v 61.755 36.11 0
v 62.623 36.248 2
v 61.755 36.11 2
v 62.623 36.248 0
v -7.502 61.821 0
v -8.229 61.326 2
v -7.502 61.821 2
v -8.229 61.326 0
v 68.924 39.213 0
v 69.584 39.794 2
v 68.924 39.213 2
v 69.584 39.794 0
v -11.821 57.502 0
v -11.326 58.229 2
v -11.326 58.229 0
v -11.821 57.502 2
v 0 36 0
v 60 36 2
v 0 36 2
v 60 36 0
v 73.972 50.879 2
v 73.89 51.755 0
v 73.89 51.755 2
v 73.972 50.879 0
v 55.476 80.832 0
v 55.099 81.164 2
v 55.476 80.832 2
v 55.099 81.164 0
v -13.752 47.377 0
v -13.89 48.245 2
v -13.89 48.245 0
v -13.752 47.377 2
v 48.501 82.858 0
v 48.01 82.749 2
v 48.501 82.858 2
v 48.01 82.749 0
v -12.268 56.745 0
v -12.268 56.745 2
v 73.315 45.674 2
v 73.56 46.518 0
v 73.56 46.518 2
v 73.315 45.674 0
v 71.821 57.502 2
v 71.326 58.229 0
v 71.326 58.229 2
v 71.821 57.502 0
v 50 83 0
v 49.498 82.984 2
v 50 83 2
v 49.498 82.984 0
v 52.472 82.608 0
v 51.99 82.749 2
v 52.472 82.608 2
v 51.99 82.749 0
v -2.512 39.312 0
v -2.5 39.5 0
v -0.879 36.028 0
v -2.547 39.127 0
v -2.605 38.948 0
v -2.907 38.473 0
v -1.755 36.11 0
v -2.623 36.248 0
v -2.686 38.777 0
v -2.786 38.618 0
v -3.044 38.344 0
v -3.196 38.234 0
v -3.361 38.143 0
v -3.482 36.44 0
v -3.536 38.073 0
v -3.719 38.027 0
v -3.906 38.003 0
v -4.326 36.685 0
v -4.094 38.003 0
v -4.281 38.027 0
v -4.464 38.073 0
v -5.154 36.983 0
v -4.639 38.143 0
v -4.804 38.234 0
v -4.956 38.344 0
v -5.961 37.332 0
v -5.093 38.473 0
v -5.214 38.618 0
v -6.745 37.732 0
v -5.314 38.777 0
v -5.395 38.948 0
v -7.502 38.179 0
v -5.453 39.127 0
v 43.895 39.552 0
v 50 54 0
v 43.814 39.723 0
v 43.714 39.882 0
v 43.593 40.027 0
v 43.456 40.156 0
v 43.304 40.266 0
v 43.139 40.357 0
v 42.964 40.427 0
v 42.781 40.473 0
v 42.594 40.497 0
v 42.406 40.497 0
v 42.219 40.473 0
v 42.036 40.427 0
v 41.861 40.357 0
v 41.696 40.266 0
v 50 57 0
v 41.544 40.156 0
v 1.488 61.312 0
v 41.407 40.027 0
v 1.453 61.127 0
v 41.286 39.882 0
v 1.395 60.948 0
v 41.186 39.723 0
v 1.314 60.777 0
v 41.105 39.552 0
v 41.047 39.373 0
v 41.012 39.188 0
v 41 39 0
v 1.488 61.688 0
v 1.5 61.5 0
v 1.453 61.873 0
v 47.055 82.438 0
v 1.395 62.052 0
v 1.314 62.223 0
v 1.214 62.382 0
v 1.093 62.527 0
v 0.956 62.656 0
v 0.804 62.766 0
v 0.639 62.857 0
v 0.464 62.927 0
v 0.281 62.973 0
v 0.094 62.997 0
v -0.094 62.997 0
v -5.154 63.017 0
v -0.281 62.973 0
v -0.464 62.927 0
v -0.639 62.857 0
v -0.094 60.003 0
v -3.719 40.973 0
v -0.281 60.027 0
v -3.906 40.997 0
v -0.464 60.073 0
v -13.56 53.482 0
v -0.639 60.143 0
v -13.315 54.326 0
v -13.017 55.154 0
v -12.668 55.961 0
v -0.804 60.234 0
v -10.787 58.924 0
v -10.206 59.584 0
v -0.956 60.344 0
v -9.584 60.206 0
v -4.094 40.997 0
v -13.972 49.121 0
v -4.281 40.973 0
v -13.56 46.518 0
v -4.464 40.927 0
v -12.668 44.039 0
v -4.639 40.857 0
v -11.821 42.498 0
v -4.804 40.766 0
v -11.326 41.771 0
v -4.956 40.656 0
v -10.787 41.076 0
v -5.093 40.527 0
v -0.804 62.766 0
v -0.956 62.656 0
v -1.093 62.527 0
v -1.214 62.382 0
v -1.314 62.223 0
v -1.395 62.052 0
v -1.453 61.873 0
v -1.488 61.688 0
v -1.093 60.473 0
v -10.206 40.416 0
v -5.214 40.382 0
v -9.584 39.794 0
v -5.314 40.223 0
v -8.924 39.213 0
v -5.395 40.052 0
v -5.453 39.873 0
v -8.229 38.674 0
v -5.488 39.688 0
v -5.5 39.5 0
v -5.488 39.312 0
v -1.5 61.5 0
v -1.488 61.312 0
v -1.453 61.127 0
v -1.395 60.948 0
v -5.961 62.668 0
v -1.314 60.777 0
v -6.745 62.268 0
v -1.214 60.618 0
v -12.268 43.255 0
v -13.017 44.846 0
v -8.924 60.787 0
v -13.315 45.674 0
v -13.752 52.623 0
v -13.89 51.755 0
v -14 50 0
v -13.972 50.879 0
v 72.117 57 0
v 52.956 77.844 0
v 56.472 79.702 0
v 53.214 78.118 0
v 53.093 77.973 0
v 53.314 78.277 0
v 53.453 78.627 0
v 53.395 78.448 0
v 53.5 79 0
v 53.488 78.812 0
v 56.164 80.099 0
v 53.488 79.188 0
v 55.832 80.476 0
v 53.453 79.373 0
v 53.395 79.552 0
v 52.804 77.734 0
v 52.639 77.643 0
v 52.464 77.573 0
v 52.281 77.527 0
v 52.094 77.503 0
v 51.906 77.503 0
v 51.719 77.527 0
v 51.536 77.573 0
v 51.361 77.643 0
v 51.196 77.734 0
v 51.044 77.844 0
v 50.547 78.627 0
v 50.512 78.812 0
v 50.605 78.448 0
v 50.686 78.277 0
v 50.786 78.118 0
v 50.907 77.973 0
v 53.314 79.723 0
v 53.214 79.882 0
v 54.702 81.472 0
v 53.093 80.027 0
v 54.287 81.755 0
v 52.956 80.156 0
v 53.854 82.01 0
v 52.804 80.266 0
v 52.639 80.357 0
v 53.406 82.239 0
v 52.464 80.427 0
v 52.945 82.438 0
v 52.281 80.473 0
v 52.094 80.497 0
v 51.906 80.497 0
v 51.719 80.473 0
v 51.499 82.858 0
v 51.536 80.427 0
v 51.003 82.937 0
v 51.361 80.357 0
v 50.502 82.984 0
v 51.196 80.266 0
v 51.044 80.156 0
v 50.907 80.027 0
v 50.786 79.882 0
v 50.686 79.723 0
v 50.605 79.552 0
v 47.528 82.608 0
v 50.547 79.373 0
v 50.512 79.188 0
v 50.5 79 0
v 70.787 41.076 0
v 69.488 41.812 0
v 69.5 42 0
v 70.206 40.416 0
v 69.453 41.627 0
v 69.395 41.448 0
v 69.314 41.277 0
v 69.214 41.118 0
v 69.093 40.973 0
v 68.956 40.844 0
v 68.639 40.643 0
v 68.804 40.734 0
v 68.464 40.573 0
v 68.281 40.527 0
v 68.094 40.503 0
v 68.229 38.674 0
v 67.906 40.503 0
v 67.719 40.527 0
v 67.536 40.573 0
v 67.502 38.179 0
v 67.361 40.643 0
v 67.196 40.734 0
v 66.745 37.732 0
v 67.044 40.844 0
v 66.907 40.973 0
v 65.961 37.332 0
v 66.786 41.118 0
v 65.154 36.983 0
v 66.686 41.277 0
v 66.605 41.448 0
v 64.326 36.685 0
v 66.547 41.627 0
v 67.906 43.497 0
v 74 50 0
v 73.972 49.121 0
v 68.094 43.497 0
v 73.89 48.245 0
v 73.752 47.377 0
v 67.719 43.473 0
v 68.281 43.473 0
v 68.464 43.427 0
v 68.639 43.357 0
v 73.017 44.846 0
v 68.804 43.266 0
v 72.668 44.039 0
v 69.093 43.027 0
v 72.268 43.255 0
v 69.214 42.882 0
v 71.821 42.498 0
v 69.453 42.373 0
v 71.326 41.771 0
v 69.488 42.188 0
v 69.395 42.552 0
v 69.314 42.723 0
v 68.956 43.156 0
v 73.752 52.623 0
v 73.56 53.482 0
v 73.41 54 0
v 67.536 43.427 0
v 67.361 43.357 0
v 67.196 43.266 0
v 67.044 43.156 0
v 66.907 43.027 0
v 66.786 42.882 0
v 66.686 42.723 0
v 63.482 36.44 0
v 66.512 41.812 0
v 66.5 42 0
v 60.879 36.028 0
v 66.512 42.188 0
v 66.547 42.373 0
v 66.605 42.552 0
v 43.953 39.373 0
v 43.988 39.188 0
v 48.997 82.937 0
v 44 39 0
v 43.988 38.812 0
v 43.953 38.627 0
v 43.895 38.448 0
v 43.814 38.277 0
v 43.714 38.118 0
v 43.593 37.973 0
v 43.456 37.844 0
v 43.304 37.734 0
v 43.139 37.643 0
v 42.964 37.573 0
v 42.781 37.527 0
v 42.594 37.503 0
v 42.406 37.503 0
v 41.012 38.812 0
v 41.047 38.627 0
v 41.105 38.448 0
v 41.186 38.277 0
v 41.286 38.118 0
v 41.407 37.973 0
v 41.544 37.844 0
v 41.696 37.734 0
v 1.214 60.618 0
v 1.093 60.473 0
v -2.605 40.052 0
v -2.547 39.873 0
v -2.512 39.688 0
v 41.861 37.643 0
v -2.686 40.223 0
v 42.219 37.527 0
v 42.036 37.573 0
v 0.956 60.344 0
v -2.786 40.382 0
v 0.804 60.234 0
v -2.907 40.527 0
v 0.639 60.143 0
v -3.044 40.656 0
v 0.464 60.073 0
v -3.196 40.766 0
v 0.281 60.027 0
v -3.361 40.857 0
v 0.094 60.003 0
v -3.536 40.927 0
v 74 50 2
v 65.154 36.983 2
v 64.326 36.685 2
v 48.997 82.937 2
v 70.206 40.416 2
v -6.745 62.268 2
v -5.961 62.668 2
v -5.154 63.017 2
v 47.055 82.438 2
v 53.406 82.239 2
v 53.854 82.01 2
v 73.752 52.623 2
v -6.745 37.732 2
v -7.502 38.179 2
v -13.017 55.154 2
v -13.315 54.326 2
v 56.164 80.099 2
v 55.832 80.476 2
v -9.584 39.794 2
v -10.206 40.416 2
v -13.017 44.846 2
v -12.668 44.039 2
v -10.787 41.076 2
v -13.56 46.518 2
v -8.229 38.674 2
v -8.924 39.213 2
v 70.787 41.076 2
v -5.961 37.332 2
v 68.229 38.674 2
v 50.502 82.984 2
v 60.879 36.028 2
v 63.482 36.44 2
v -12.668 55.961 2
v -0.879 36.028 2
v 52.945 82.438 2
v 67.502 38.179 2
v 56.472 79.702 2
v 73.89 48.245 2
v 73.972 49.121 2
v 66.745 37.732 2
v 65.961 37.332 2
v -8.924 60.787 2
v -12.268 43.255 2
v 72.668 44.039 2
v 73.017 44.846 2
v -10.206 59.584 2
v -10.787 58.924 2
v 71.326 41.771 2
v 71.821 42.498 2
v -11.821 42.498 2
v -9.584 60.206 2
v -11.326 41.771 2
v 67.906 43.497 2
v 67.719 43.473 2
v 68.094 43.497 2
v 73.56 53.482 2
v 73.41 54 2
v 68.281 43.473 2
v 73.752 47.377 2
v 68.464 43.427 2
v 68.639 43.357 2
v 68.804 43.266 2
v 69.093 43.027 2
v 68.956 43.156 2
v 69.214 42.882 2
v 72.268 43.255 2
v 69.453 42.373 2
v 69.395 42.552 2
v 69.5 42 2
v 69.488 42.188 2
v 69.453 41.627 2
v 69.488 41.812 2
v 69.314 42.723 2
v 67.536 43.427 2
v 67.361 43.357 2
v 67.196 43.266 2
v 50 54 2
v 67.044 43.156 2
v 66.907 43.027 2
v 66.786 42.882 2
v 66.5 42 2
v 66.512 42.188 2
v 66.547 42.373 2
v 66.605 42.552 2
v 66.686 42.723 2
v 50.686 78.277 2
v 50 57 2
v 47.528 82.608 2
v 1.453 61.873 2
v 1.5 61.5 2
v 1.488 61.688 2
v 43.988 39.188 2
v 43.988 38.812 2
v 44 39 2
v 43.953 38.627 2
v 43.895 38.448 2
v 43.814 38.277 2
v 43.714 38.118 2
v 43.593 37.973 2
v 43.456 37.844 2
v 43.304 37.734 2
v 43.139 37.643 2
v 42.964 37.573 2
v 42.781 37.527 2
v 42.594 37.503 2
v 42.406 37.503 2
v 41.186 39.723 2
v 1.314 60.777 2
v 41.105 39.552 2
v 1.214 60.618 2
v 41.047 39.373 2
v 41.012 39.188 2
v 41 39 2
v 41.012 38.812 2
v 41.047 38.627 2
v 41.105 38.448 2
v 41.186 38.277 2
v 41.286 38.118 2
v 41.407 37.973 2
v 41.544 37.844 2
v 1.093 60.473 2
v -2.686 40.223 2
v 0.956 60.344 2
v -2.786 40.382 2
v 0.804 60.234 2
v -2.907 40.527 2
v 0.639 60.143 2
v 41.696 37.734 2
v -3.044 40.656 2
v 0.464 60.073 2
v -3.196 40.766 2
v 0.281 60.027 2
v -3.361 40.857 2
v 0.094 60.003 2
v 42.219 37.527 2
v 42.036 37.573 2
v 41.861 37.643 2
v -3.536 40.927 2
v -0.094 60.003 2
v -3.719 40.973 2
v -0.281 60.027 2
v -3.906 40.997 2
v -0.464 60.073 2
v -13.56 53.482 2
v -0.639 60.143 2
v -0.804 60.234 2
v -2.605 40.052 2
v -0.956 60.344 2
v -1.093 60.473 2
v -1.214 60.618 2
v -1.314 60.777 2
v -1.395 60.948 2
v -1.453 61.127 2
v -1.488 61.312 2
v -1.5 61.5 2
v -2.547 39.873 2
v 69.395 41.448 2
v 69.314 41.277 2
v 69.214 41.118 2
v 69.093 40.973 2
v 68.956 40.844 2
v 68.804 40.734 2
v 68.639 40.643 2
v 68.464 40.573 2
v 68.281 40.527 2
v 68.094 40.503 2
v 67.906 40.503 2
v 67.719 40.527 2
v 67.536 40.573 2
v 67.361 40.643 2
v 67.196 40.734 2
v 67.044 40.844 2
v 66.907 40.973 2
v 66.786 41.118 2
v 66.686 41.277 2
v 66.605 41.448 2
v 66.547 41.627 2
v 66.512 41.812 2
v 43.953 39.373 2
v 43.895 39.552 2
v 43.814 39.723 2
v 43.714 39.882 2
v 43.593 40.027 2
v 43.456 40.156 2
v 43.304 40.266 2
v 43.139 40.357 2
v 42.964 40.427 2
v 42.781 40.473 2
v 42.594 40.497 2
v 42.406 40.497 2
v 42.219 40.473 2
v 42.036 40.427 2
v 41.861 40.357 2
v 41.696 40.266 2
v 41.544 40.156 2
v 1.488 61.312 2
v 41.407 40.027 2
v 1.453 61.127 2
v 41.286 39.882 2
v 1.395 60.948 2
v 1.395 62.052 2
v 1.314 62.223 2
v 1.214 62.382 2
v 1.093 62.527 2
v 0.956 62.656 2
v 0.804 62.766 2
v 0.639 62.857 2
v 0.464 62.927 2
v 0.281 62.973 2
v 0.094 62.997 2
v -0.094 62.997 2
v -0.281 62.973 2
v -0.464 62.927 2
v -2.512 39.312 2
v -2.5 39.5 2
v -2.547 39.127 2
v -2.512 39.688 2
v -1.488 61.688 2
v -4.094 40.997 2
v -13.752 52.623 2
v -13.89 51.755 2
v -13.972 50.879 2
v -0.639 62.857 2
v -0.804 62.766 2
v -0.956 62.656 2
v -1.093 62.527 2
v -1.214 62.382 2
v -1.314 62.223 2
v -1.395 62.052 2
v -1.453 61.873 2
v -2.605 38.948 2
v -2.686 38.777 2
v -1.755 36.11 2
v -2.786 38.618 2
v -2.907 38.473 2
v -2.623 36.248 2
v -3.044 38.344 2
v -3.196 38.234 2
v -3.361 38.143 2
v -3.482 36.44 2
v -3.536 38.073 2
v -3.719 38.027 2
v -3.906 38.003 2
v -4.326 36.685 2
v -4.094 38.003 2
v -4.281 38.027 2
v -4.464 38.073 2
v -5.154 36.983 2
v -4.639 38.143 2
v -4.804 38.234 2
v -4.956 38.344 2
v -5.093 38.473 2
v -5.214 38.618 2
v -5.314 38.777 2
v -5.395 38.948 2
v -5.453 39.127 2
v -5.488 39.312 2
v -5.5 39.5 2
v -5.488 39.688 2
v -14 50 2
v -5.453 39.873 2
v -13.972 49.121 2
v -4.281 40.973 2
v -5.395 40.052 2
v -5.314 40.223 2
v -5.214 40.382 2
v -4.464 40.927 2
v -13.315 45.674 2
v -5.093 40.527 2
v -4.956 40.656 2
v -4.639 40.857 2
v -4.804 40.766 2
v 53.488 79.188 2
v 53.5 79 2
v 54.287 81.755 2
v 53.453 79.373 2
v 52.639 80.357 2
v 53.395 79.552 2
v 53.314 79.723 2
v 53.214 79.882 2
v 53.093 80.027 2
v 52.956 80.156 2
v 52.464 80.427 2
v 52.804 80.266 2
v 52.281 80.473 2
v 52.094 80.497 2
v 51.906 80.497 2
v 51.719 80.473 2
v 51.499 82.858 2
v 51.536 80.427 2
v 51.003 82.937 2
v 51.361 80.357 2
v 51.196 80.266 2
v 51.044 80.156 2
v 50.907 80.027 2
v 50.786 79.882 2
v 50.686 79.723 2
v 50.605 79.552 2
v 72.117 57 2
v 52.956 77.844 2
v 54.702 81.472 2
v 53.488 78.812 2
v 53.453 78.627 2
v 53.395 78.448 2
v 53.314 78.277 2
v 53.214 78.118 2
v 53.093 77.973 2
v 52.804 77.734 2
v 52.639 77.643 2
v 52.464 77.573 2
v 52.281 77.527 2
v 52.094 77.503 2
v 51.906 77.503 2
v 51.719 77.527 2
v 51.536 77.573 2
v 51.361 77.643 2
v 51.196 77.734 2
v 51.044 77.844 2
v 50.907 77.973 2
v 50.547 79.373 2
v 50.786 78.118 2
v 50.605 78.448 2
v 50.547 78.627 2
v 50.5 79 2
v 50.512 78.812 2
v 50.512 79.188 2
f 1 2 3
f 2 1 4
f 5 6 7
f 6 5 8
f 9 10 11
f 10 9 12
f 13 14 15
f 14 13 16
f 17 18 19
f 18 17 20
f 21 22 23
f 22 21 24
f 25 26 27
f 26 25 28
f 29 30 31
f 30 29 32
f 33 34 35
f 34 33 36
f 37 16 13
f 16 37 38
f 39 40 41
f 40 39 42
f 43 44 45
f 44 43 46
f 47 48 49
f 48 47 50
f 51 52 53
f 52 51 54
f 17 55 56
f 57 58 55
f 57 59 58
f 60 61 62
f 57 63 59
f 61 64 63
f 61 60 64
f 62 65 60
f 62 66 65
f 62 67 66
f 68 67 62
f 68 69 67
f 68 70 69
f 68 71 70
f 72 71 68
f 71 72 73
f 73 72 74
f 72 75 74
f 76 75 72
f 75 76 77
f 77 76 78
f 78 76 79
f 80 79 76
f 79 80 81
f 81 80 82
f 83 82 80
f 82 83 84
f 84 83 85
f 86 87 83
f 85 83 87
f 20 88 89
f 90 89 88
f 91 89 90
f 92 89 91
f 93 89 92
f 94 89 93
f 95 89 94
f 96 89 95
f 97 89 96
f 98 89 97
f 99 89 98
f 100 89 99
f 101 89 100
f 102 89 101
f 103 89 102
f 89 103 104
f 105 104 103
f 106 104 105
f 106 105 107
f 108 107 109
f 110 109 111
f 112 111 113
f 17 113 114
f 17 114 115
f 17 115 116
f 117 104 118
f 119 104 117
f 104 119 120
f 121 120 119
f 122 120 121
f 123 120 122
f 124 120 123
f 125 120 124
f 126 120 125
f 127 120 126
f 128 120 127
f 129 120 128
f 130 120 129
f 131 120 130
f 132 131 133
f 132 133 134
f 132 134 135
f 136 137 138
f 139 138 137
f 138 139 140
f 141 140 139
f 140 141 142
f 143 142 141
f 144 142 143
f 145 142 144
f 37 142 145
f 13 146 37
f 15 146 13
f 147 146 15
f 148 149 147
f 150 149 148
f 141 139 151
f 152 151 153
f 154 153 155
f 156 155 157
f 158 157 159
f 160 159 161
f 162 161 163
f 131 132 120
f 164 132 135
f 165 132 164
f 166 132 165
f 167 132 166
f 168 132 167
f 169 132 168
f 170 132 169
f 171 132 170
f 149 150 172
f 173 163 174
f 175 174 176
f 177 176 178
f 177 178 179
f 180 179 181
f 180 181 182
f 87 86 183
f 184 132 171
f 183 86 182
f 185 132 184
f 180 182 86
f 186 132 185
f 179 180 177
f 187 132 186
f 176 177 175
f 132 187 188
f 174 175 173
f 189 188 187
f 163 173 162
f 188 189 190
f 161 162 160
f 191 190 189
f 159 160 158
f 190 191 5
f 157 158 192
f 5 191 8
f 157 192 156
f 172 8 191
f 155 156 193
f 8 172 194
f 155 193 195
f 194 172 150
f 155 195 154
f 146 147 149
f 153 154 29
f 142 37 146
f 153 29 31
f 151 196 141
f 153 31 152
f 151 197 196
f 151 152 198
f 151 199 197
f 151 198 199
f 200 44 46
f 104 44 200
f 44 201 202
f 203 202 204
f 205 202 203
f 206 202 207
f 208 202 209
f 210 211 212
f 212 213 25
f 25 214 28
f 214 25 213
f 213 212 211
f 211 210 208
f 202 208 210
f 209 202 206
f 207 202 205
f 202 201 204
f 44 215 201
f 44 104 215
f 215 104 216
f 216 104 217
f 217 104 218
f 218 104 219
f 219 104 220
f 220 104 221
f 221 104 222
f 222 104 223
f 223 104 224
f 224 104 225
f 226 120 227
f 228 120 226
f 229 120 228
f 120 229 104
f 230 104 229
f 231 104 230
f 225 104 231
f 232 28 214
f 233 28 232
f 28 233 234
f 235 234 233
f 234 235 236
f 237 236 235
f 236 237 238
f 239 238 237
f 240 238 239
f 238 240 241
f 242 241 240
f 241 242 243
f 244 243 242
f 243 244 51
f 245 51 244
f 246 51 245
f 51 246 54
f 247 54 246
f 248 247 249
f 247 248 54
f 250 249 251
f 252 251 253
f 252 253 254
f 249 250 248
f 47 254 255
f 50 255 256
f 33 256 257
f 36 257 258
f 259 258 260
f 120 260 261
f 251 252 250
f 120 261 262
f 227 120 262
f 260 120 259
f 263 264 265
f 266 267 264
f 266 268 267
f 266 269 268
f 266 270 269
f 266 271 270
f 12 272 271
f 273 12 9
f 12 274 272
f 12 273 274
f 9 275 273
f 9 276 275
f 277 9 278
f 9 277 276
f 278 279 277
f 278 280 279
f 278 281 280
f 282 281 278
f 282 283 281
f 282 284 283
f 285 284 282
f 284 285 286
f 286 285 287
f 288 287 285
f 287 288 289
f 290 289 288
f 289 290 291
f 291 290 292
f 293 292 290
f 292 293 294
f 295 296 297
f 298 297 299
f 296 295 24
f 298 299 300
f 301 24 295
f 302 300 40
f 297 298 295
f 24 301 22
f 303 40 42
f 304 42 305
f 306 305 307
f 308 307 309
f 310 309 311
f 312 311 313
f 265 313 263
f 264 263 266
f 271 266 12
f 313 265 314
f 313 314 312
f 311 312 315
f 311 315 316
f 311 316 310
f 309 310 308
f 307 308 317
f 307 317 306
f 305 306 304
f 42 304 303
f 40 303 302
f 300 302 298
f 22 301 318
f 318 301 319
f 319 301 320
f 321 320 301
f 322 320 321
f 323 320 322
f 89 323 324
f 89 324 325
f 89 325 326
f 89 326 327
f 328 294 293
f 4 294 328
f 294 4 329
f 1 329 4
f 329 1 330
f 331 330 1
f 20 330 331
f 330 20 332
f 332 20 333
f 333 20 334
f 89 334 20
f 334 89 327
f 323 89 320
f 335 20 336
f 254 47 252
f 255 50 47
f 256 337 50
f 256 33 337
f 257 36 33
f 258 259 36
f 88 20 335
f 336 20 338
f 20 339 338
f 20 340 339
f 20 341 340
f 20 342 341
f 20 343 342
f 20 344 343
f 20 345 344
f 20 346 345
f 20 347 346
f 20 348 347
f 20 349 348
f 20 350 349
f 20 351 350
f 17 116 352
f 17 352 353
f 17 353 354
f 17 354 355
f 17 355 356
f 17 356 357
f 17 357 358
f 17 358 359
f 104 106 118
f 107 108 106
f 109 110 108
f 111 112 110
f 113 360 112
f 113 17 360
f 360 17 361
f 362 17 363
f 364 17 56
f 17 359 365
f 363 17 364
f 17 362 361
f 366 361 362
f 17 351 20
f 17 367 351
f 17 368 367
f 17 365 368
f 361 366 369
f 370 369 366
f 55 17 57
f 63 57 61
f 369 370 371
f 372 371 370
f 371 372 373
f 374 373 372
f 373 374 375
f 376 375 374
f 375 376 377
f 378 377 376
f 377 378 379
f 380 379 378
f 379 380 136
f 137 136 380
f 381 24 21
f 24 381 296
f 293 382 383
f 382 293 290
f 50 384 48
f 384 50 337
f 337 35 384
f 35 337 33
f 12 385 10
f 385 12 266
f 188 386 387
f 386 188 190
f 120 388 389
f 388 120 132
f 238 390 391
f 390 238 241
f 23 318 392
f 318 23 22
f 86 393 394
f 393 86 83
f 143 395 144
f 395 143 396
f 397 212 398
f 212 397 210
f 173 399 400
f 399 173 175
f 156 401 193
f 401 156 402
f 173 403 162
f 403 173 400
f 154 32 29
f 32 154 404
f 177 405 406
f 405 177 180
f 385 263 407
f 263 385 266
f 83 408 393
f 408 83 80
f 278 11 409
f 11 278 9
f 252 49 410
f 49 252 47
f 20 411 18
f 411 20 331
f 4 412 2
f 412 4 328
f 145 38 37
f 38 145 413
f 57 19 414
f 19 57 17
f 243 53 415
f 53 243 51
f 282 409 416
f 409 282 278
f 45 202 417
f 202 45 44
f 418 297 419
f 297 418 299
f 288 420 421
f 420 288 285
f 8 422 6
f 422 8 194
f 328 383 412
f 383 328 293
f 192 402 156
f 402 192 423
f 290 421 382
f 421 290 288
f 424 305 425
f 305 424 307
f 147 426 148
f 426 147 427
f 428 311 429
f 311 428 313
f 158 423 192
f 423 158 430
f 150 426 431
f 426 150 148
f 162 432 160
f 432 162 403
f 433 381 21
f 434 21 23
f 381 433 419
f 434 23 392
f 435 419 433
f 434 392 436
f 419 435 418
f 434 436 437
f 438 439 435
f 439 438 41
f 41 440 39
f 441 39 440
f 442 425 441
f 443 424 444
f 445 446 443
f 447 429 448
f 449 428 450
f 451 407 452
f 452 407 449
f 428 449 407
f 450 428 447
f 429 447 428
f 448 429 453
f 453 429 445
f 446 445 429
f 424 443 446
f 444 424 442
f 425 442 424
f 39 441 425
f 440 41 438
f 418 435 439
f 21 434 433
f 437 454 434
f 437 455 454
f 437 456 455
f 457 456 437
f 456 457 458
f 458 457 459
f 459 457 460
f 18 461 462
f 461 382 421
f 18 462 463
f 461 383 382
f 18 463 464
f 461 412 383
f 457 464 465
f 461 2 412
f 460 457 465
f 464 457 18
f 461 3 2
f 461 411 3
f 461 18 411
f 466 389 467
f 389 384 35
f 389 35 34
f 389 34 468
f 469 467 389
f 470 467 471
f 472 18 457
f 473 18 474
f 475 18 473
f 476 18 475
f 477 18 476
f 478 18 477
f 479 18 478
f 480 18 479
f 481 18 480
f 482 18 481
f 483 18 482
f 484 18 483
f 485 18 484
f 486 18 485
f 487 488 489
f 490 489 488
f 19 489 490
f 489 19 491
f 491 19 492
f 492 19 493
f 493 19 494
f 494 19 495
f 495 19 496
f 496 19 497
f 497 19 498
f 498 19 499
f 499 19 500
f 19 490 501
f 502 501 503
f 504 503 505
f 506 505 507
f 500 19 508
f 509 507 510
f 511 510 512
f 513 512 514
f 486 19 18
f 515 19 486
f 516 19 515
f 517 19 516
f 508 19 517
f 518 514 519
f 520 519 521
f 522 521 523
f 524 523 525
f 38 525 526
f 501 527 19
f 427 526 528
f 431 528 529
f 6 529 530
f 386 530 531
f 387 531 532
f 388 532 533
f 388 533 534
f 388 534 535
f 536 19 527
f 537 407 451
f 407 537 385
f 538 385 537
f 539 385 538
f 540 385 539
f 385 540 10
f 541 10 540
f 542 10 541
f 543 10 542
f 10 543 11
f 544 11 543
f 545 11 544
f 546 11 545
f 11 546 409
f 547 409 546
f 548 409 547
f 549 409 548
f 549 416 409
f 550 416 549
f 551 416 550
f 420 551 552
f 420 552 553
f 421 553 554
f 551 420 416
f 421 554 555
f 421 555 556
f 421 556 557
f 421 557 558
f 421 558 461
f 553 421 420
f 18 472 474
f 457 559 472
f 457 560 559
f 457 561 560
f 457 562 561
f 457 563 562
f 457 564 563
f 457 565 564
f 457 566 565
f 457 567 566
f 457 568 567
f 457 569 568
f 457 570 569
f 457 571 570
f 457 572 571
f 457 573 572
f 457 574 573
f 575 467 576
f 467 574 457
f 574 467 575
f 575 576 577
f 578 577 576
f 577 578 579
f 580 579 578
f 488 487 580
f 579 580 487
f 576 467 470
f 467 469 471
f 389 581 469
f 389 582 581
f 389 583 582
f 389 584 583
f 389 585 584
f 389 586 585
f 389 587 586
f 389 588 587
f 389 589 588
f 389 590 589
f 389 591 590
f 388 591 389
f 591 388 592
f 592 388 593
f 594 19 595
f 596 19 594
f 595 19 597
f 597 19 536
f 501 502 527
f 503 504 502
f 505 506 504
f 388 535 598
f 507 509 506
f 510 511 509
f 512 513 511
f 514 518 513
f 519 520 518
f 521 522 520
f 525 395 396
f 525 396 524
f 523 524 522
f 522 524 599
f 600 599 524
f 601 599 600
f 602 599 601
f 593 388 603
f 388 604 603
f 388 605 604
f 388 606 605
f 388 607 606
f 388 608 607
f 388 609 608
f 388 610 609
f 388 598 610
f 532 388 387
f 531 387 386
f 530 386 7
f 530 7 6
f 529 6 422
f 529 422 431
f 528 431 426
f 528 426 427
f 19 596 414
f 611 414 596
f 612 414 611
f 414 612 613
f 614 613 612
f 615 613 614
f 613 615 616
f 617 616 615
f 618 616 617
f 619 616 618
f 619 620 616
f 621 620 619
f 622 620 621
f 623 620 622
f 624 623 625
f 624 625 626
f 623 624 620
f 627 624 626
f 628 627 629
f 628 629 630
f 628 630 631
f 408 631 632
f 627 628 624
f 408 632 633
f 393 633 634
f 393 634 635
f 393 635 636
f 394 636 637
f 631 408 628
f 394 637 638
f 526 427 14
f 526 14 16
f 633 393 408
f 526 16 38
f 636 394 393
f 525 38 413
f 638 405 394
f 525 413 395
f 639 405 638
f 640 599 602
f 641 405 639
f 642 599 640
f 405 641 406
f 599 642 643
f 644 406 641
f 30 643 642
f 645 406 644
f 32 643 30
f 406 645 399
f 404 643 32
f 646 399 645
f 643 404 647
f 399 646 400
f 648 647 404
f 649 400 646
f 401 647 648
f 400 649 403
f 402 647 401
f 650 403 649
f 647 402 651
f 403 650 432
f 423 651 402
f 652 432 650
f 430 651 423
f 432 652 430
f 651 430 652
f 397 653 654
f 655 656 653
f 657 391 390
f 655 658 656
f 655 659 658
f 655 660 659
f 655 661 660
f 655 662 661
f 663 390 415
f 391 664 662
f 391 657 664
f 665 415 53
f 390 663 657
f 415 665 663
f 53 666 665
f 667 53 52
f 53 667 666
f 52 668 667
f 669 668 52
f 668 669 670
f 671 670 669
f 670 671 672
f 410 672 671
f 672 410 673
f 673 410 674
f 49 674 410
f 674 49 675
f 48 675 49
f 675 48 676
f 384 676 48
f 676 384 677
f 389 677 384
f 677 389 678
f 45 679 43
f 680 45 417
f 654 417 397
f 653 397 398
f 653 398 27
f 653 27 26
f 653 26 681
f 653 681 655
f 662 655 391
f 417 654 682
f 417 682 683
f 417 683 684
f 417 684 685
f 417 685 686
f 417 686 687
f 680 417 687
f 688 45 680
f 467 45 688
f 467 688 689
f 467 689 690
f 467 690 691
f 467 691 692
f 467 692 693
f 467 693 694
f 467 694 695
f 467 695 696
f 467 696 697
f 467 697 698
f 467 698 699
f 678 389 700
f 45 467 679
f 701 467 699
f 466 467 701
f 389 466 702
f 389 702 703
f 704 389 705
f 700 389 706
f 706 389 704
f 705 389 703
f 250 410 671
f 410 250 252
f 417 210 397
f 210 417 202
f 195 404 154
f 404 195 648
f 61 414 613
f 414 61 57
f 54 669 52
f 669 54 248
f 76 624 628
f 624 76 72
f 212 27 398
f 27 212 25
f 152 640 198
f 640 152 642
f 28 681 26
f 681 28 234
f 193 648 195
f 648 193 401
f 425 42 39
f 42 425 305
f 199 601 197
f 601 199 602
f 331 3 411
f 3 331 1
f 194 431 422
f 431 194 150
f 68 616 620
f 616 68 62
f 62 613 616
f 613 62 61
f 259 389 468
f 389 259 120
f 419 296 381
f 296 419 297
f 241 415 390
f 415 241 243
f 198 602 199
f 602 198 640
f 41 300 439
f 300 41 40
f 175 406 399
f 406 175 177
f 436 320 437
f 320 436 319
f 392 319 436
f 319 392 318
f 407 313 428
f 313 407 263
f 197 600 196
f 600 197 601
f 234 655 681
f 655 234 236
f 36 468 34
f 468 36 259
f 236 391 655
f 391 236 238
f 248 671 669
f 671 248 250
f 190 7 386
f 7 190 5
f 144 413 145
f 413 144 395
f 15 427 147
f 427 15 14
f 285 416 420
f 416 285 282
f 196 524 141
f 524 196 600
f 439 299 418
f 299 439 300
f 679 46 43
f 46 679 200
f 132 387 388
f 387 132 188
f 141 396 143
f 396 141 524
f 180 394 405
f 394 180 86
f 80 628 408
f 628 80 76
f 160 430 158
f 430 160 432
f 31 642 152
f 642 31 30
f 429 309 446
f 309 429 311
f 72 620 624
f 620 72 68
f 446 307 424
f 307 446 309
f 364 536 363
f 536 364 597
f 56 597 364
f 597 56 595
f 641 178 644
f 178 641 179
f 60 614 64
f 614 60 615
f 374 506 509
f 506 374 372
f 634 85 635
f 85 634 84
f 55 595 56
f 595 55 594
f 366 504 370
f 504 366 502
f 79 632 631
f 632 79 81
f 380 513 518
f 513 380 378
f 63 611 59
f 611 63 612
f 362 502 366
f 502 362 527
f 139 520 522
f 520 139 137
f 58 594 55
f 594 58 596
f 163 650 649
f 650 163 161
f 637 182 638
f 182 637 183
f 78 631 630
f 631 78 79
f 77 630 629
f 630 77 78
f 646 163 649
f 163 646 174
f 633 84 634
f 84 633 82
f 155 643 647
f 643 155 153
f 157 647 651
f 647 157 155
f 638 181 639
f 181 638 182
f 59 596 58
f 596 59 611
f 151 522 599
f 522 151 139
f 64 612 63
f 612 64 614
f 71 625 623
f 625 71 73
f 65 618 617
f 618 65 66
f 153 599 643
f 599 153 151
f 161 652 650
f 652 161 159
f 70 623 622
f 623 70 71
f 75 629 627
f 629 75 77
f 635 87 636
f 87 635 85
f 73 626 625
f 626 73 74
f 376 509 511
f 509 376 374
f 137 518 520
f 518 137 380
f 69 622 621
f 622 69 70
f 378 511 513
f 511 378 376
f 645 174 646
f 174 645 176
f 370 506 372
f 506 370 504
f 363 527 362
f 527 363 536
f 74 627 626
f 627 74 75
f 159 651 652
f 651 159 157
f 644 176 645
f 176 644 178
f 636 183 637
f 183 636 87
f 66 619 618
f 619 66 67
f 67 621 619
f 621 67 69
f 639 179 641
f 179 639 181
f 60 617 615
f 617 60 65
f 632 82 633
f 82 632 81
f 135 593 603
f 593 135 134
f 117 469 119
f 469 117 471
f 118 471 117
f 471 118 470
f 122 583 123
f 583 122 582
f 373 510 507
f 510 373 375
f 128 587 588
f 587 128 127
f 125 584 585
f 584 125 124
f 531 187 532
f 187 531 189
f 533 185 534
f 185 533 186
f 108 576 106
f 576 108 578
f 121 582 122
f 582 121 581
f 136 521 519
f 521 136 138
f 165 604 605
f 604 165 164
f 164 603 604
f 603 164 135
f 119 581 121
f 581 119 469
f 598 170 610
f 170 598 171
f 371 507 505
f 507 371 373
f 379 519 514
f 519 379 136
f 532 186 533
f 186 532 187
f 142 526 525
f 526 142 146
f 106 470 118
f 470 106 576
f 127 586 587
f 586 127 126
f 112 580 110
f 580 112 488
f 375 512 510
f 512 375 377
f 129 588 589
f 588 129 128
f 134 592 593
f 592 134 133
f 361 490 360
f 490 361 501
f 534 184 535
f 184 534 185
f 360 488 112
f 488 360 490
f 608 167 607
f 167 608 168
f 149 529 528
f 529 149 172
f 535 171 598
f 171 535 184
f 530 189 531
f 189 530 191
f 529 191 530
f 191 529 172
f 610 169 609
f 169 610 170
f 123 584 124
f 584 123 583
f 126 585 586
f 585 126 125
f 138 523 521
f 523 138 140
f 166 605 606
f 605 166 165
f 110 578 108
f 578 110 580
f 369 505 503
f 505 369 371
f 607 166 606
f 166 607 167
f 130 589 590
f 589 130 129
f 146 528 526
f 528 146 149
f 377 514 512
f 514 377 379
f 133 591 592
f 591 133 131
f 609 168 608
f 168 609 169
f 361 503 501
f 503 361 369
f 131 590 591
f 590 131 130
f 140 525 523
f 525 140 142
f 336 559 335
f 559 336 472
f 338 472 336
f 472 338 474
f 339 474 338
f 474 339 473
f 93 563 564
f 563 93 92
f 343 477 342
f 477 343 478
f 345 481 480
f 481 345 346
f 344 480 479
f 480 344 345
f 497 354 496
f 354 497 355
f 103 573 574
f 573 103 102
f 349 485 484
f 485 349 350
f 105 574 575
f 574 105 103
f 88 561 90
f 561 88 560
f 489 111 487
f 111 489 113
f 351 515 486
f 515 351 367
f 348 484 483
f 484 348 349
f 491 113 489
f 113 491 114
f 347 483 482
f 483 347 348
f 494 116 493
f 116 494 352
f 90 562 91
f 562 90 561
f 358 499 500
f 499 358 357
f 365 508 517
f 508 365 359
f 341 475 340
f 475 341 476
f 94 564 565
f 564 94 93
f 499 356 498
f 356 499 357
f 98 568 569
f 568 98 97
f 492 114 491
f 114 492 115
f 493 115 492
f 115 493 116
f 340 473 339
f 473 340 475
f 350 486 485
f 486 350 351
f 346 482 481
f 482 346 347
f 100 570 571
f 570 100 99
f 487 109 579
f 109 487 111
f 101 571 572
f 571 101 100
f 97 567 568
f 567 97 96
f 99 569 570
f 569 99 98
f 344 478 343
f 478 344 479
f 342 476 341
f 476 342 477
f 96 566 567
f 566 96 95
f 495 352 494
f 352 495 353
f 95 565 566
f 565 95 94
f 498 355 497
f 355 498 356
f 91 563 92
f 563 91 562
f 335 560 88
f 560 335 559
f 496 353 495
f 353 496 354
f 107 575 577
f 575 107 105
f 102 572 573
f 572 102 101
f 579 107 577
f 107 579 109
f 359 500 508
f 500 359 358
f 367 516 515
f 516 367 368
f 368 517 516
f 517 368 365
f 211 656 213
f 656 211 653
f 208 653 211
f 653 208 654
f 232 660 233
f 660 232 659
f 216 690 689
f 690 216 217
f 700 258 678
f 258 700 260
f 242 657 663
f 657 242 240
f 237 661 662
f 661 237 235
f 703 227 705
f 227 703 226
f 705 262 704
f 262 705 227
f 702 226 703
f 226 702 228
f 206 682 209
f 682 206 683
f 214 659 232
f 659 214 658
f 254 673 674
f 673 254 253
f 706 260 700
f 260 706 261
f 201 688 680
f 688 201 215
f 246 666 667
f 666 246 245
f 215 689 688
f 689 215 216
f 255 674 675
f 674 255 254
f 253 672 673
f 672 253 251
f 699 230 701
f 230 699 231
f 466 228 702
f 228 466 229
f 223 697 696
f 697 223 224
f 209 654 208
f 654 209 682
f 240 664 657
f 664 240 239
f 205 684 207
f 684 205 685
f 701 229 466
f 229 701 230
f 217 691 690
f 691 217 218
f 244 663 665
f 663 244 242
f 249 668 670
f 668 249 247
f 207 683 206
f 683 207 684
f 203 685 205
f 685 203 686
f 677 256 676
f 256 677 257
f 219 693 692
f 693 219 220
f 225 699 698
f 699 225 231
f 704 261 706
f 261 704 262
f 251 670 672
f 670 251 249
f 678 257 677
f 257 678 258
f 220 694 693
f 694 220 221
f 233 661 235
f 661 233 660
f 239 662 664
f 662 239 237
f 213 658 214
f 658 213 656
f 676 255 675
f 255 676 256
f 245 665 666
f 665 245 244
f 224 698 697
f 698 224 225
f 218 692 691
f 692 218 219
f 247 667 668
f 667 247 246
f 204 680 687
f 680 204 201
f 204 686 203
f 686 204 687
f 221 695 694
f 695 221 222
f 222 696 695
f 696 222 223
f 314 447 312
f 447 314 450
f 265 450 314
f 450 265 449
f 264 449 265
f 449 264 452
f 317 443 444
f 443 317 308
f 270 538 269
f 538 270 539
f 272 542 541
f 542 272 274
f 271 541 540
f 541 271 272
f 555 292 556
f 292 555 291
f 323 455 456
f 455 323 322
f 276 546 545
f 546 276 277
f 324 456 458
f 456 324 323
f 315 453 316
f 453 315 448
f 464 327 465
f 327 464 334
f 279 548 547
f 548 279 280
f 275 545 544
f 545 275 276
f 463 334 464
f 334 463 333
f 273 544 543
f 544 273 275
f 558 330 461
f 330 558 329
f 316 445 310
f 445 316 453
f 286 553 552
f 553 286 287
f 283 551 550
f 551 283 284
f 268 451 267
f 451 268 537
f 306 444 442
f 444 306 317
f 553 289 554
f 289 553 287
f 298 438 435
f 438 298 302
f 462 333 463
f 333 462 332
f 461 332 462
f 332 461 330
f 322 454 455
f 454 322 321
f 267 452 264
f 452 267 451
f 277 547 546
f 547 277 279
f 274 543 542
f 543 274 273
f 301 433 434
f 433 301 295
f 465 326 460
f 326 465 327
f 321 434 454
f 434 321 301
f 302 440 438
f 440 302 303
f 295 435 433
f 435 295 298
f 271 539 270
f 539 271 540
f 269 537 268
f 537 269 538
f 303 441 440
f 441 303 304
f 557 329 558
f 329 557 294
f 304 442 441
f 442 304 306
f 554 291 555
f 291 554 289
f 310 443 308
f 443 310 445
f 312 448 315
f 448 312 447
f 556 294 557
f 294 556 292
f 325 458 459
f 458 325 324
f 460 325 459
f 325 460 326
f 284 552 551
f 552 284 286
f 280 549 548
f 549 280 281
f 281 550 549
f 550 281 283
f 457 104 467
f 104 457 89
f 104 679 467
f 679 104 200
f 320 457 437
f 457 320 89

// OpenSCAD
r_ext=14;
ep=2;
hauteur=98;
r_vis=1.4;

module boitier(){
	difference(){
		hull(){
			cylinder(h = hauteur, r = r_ext, $fn=100);
			translate([60,0,0]){cylinder(h = hauteur, r = r_ext, $fn=100);}
			translate([50,25,0]){cylinder(h = hauteur, r = 8, $fn=100);}
		}

		//évidement intérieur général
		hull(){
			translate([0,0,-2])cylinder(h = hauteur+5, r = r_ext-ep, $fn=100);
			translate([60,0,-2]){cylinder(h = hauteur+5, r = r_ext-ep, $fn=100);}
			translate([50,25,-2]){cylinder(h = hauteur+5, r = 6, $fn=100);}
		}
		//ouvertures pour écran
		translate([7,-r_ext-5,10]){cube([26,10,hauteur-20]);}

		//trous pour visser carte
		translate([-8,-r_ext-5,2.5]){rotate([-90,0,0])cylinder(h = 15, r = 1.5, $fn=50);}
		translate([-8,-r_ext-5,hauteur-2.5]){rotate([-90,0,0])cylinder(h = 15, r = 1.5, $fn=50);}

		//trou pour encodeur
		translate([59,-r_ext-5,61.5]){rotate([-90,0,0])cylinder(h = 15, r = 5, $fn=50);}
		
		
	}

	//ajout pour vissage des flancs
	difference(){
		union(){
			translate([-4,-r_ext+3.5,0])cylinder(h = hauteur, r = 2.5, $fn=50);
			translate([0,r_ext-2.5,0])cylinder(h = hauteur, r = 2.5, $fn=50);
			translate([42.5,-r_ext+3,0])cylinder(h = hauteur, r = 2.5, $fn=50);
			translate([52,29,0])cylinder(h = hauteur, r = 2.5, $fn=50);
			translate([68,-r_ext+6,0])cylinder(h = hauteur, r = 2.5, $fn=50);
		}

		translate([-4,-r_ext+3.5,-2])cylinder(h = hauteur+10, r = r_vis, $fn=50);
		translate([0,r_ext-2.5,-2])cylinder(h = hauteur+10, r = r_vis, $fn=50);
		translate([42.5,-r_ext+3,-2])cylinder(h = hauteur+10, r = r_vis, $fn=50);
		translate([52,29,-2])cylinder(h = hauteur+10, r = r_vis, $fn=50);
		translate([68,-r_ext+6,-2])cylinder(h = hauteur+10, r = r_vis, $fn=50);
	}
	

}

module capot(){
	difference(){

	hull(){
			cylinder(h = ep, r = r_ext, $fn=100);
			translate([60,0,0]){cylinder(h = ep, r = r_ext, $fn=100);}
			translate([50,25,0]){cylinder(h = ep, r = 8, $fn=100);}
		}

	translate([-4,-r_ext+3.5,-2])cylinder(h = hauteur+10, r = 1.5, $fn=50);
	translate([0,r_ext-2.5,-2])cylinder(h = hauteur+10, r = 1.5, $fn=50);
	translate([42.5,-r_ext+3,-2])cylinder(h = hauteur+10, r = 1.5, $fn=50);
	translate([52,29,-2])cylinder(h = hauteur+10, r = 1.5, $fn=50);
	translate([68,-r_ext+6,-2])cylinder(h = hauteur, r = 1.5, $fn=50);

	//trou pour carte SD
	translate([50,4,-2]){cube([25,3,5]);}

	}
}

//boitier();

translate([0,50,0])capot();
